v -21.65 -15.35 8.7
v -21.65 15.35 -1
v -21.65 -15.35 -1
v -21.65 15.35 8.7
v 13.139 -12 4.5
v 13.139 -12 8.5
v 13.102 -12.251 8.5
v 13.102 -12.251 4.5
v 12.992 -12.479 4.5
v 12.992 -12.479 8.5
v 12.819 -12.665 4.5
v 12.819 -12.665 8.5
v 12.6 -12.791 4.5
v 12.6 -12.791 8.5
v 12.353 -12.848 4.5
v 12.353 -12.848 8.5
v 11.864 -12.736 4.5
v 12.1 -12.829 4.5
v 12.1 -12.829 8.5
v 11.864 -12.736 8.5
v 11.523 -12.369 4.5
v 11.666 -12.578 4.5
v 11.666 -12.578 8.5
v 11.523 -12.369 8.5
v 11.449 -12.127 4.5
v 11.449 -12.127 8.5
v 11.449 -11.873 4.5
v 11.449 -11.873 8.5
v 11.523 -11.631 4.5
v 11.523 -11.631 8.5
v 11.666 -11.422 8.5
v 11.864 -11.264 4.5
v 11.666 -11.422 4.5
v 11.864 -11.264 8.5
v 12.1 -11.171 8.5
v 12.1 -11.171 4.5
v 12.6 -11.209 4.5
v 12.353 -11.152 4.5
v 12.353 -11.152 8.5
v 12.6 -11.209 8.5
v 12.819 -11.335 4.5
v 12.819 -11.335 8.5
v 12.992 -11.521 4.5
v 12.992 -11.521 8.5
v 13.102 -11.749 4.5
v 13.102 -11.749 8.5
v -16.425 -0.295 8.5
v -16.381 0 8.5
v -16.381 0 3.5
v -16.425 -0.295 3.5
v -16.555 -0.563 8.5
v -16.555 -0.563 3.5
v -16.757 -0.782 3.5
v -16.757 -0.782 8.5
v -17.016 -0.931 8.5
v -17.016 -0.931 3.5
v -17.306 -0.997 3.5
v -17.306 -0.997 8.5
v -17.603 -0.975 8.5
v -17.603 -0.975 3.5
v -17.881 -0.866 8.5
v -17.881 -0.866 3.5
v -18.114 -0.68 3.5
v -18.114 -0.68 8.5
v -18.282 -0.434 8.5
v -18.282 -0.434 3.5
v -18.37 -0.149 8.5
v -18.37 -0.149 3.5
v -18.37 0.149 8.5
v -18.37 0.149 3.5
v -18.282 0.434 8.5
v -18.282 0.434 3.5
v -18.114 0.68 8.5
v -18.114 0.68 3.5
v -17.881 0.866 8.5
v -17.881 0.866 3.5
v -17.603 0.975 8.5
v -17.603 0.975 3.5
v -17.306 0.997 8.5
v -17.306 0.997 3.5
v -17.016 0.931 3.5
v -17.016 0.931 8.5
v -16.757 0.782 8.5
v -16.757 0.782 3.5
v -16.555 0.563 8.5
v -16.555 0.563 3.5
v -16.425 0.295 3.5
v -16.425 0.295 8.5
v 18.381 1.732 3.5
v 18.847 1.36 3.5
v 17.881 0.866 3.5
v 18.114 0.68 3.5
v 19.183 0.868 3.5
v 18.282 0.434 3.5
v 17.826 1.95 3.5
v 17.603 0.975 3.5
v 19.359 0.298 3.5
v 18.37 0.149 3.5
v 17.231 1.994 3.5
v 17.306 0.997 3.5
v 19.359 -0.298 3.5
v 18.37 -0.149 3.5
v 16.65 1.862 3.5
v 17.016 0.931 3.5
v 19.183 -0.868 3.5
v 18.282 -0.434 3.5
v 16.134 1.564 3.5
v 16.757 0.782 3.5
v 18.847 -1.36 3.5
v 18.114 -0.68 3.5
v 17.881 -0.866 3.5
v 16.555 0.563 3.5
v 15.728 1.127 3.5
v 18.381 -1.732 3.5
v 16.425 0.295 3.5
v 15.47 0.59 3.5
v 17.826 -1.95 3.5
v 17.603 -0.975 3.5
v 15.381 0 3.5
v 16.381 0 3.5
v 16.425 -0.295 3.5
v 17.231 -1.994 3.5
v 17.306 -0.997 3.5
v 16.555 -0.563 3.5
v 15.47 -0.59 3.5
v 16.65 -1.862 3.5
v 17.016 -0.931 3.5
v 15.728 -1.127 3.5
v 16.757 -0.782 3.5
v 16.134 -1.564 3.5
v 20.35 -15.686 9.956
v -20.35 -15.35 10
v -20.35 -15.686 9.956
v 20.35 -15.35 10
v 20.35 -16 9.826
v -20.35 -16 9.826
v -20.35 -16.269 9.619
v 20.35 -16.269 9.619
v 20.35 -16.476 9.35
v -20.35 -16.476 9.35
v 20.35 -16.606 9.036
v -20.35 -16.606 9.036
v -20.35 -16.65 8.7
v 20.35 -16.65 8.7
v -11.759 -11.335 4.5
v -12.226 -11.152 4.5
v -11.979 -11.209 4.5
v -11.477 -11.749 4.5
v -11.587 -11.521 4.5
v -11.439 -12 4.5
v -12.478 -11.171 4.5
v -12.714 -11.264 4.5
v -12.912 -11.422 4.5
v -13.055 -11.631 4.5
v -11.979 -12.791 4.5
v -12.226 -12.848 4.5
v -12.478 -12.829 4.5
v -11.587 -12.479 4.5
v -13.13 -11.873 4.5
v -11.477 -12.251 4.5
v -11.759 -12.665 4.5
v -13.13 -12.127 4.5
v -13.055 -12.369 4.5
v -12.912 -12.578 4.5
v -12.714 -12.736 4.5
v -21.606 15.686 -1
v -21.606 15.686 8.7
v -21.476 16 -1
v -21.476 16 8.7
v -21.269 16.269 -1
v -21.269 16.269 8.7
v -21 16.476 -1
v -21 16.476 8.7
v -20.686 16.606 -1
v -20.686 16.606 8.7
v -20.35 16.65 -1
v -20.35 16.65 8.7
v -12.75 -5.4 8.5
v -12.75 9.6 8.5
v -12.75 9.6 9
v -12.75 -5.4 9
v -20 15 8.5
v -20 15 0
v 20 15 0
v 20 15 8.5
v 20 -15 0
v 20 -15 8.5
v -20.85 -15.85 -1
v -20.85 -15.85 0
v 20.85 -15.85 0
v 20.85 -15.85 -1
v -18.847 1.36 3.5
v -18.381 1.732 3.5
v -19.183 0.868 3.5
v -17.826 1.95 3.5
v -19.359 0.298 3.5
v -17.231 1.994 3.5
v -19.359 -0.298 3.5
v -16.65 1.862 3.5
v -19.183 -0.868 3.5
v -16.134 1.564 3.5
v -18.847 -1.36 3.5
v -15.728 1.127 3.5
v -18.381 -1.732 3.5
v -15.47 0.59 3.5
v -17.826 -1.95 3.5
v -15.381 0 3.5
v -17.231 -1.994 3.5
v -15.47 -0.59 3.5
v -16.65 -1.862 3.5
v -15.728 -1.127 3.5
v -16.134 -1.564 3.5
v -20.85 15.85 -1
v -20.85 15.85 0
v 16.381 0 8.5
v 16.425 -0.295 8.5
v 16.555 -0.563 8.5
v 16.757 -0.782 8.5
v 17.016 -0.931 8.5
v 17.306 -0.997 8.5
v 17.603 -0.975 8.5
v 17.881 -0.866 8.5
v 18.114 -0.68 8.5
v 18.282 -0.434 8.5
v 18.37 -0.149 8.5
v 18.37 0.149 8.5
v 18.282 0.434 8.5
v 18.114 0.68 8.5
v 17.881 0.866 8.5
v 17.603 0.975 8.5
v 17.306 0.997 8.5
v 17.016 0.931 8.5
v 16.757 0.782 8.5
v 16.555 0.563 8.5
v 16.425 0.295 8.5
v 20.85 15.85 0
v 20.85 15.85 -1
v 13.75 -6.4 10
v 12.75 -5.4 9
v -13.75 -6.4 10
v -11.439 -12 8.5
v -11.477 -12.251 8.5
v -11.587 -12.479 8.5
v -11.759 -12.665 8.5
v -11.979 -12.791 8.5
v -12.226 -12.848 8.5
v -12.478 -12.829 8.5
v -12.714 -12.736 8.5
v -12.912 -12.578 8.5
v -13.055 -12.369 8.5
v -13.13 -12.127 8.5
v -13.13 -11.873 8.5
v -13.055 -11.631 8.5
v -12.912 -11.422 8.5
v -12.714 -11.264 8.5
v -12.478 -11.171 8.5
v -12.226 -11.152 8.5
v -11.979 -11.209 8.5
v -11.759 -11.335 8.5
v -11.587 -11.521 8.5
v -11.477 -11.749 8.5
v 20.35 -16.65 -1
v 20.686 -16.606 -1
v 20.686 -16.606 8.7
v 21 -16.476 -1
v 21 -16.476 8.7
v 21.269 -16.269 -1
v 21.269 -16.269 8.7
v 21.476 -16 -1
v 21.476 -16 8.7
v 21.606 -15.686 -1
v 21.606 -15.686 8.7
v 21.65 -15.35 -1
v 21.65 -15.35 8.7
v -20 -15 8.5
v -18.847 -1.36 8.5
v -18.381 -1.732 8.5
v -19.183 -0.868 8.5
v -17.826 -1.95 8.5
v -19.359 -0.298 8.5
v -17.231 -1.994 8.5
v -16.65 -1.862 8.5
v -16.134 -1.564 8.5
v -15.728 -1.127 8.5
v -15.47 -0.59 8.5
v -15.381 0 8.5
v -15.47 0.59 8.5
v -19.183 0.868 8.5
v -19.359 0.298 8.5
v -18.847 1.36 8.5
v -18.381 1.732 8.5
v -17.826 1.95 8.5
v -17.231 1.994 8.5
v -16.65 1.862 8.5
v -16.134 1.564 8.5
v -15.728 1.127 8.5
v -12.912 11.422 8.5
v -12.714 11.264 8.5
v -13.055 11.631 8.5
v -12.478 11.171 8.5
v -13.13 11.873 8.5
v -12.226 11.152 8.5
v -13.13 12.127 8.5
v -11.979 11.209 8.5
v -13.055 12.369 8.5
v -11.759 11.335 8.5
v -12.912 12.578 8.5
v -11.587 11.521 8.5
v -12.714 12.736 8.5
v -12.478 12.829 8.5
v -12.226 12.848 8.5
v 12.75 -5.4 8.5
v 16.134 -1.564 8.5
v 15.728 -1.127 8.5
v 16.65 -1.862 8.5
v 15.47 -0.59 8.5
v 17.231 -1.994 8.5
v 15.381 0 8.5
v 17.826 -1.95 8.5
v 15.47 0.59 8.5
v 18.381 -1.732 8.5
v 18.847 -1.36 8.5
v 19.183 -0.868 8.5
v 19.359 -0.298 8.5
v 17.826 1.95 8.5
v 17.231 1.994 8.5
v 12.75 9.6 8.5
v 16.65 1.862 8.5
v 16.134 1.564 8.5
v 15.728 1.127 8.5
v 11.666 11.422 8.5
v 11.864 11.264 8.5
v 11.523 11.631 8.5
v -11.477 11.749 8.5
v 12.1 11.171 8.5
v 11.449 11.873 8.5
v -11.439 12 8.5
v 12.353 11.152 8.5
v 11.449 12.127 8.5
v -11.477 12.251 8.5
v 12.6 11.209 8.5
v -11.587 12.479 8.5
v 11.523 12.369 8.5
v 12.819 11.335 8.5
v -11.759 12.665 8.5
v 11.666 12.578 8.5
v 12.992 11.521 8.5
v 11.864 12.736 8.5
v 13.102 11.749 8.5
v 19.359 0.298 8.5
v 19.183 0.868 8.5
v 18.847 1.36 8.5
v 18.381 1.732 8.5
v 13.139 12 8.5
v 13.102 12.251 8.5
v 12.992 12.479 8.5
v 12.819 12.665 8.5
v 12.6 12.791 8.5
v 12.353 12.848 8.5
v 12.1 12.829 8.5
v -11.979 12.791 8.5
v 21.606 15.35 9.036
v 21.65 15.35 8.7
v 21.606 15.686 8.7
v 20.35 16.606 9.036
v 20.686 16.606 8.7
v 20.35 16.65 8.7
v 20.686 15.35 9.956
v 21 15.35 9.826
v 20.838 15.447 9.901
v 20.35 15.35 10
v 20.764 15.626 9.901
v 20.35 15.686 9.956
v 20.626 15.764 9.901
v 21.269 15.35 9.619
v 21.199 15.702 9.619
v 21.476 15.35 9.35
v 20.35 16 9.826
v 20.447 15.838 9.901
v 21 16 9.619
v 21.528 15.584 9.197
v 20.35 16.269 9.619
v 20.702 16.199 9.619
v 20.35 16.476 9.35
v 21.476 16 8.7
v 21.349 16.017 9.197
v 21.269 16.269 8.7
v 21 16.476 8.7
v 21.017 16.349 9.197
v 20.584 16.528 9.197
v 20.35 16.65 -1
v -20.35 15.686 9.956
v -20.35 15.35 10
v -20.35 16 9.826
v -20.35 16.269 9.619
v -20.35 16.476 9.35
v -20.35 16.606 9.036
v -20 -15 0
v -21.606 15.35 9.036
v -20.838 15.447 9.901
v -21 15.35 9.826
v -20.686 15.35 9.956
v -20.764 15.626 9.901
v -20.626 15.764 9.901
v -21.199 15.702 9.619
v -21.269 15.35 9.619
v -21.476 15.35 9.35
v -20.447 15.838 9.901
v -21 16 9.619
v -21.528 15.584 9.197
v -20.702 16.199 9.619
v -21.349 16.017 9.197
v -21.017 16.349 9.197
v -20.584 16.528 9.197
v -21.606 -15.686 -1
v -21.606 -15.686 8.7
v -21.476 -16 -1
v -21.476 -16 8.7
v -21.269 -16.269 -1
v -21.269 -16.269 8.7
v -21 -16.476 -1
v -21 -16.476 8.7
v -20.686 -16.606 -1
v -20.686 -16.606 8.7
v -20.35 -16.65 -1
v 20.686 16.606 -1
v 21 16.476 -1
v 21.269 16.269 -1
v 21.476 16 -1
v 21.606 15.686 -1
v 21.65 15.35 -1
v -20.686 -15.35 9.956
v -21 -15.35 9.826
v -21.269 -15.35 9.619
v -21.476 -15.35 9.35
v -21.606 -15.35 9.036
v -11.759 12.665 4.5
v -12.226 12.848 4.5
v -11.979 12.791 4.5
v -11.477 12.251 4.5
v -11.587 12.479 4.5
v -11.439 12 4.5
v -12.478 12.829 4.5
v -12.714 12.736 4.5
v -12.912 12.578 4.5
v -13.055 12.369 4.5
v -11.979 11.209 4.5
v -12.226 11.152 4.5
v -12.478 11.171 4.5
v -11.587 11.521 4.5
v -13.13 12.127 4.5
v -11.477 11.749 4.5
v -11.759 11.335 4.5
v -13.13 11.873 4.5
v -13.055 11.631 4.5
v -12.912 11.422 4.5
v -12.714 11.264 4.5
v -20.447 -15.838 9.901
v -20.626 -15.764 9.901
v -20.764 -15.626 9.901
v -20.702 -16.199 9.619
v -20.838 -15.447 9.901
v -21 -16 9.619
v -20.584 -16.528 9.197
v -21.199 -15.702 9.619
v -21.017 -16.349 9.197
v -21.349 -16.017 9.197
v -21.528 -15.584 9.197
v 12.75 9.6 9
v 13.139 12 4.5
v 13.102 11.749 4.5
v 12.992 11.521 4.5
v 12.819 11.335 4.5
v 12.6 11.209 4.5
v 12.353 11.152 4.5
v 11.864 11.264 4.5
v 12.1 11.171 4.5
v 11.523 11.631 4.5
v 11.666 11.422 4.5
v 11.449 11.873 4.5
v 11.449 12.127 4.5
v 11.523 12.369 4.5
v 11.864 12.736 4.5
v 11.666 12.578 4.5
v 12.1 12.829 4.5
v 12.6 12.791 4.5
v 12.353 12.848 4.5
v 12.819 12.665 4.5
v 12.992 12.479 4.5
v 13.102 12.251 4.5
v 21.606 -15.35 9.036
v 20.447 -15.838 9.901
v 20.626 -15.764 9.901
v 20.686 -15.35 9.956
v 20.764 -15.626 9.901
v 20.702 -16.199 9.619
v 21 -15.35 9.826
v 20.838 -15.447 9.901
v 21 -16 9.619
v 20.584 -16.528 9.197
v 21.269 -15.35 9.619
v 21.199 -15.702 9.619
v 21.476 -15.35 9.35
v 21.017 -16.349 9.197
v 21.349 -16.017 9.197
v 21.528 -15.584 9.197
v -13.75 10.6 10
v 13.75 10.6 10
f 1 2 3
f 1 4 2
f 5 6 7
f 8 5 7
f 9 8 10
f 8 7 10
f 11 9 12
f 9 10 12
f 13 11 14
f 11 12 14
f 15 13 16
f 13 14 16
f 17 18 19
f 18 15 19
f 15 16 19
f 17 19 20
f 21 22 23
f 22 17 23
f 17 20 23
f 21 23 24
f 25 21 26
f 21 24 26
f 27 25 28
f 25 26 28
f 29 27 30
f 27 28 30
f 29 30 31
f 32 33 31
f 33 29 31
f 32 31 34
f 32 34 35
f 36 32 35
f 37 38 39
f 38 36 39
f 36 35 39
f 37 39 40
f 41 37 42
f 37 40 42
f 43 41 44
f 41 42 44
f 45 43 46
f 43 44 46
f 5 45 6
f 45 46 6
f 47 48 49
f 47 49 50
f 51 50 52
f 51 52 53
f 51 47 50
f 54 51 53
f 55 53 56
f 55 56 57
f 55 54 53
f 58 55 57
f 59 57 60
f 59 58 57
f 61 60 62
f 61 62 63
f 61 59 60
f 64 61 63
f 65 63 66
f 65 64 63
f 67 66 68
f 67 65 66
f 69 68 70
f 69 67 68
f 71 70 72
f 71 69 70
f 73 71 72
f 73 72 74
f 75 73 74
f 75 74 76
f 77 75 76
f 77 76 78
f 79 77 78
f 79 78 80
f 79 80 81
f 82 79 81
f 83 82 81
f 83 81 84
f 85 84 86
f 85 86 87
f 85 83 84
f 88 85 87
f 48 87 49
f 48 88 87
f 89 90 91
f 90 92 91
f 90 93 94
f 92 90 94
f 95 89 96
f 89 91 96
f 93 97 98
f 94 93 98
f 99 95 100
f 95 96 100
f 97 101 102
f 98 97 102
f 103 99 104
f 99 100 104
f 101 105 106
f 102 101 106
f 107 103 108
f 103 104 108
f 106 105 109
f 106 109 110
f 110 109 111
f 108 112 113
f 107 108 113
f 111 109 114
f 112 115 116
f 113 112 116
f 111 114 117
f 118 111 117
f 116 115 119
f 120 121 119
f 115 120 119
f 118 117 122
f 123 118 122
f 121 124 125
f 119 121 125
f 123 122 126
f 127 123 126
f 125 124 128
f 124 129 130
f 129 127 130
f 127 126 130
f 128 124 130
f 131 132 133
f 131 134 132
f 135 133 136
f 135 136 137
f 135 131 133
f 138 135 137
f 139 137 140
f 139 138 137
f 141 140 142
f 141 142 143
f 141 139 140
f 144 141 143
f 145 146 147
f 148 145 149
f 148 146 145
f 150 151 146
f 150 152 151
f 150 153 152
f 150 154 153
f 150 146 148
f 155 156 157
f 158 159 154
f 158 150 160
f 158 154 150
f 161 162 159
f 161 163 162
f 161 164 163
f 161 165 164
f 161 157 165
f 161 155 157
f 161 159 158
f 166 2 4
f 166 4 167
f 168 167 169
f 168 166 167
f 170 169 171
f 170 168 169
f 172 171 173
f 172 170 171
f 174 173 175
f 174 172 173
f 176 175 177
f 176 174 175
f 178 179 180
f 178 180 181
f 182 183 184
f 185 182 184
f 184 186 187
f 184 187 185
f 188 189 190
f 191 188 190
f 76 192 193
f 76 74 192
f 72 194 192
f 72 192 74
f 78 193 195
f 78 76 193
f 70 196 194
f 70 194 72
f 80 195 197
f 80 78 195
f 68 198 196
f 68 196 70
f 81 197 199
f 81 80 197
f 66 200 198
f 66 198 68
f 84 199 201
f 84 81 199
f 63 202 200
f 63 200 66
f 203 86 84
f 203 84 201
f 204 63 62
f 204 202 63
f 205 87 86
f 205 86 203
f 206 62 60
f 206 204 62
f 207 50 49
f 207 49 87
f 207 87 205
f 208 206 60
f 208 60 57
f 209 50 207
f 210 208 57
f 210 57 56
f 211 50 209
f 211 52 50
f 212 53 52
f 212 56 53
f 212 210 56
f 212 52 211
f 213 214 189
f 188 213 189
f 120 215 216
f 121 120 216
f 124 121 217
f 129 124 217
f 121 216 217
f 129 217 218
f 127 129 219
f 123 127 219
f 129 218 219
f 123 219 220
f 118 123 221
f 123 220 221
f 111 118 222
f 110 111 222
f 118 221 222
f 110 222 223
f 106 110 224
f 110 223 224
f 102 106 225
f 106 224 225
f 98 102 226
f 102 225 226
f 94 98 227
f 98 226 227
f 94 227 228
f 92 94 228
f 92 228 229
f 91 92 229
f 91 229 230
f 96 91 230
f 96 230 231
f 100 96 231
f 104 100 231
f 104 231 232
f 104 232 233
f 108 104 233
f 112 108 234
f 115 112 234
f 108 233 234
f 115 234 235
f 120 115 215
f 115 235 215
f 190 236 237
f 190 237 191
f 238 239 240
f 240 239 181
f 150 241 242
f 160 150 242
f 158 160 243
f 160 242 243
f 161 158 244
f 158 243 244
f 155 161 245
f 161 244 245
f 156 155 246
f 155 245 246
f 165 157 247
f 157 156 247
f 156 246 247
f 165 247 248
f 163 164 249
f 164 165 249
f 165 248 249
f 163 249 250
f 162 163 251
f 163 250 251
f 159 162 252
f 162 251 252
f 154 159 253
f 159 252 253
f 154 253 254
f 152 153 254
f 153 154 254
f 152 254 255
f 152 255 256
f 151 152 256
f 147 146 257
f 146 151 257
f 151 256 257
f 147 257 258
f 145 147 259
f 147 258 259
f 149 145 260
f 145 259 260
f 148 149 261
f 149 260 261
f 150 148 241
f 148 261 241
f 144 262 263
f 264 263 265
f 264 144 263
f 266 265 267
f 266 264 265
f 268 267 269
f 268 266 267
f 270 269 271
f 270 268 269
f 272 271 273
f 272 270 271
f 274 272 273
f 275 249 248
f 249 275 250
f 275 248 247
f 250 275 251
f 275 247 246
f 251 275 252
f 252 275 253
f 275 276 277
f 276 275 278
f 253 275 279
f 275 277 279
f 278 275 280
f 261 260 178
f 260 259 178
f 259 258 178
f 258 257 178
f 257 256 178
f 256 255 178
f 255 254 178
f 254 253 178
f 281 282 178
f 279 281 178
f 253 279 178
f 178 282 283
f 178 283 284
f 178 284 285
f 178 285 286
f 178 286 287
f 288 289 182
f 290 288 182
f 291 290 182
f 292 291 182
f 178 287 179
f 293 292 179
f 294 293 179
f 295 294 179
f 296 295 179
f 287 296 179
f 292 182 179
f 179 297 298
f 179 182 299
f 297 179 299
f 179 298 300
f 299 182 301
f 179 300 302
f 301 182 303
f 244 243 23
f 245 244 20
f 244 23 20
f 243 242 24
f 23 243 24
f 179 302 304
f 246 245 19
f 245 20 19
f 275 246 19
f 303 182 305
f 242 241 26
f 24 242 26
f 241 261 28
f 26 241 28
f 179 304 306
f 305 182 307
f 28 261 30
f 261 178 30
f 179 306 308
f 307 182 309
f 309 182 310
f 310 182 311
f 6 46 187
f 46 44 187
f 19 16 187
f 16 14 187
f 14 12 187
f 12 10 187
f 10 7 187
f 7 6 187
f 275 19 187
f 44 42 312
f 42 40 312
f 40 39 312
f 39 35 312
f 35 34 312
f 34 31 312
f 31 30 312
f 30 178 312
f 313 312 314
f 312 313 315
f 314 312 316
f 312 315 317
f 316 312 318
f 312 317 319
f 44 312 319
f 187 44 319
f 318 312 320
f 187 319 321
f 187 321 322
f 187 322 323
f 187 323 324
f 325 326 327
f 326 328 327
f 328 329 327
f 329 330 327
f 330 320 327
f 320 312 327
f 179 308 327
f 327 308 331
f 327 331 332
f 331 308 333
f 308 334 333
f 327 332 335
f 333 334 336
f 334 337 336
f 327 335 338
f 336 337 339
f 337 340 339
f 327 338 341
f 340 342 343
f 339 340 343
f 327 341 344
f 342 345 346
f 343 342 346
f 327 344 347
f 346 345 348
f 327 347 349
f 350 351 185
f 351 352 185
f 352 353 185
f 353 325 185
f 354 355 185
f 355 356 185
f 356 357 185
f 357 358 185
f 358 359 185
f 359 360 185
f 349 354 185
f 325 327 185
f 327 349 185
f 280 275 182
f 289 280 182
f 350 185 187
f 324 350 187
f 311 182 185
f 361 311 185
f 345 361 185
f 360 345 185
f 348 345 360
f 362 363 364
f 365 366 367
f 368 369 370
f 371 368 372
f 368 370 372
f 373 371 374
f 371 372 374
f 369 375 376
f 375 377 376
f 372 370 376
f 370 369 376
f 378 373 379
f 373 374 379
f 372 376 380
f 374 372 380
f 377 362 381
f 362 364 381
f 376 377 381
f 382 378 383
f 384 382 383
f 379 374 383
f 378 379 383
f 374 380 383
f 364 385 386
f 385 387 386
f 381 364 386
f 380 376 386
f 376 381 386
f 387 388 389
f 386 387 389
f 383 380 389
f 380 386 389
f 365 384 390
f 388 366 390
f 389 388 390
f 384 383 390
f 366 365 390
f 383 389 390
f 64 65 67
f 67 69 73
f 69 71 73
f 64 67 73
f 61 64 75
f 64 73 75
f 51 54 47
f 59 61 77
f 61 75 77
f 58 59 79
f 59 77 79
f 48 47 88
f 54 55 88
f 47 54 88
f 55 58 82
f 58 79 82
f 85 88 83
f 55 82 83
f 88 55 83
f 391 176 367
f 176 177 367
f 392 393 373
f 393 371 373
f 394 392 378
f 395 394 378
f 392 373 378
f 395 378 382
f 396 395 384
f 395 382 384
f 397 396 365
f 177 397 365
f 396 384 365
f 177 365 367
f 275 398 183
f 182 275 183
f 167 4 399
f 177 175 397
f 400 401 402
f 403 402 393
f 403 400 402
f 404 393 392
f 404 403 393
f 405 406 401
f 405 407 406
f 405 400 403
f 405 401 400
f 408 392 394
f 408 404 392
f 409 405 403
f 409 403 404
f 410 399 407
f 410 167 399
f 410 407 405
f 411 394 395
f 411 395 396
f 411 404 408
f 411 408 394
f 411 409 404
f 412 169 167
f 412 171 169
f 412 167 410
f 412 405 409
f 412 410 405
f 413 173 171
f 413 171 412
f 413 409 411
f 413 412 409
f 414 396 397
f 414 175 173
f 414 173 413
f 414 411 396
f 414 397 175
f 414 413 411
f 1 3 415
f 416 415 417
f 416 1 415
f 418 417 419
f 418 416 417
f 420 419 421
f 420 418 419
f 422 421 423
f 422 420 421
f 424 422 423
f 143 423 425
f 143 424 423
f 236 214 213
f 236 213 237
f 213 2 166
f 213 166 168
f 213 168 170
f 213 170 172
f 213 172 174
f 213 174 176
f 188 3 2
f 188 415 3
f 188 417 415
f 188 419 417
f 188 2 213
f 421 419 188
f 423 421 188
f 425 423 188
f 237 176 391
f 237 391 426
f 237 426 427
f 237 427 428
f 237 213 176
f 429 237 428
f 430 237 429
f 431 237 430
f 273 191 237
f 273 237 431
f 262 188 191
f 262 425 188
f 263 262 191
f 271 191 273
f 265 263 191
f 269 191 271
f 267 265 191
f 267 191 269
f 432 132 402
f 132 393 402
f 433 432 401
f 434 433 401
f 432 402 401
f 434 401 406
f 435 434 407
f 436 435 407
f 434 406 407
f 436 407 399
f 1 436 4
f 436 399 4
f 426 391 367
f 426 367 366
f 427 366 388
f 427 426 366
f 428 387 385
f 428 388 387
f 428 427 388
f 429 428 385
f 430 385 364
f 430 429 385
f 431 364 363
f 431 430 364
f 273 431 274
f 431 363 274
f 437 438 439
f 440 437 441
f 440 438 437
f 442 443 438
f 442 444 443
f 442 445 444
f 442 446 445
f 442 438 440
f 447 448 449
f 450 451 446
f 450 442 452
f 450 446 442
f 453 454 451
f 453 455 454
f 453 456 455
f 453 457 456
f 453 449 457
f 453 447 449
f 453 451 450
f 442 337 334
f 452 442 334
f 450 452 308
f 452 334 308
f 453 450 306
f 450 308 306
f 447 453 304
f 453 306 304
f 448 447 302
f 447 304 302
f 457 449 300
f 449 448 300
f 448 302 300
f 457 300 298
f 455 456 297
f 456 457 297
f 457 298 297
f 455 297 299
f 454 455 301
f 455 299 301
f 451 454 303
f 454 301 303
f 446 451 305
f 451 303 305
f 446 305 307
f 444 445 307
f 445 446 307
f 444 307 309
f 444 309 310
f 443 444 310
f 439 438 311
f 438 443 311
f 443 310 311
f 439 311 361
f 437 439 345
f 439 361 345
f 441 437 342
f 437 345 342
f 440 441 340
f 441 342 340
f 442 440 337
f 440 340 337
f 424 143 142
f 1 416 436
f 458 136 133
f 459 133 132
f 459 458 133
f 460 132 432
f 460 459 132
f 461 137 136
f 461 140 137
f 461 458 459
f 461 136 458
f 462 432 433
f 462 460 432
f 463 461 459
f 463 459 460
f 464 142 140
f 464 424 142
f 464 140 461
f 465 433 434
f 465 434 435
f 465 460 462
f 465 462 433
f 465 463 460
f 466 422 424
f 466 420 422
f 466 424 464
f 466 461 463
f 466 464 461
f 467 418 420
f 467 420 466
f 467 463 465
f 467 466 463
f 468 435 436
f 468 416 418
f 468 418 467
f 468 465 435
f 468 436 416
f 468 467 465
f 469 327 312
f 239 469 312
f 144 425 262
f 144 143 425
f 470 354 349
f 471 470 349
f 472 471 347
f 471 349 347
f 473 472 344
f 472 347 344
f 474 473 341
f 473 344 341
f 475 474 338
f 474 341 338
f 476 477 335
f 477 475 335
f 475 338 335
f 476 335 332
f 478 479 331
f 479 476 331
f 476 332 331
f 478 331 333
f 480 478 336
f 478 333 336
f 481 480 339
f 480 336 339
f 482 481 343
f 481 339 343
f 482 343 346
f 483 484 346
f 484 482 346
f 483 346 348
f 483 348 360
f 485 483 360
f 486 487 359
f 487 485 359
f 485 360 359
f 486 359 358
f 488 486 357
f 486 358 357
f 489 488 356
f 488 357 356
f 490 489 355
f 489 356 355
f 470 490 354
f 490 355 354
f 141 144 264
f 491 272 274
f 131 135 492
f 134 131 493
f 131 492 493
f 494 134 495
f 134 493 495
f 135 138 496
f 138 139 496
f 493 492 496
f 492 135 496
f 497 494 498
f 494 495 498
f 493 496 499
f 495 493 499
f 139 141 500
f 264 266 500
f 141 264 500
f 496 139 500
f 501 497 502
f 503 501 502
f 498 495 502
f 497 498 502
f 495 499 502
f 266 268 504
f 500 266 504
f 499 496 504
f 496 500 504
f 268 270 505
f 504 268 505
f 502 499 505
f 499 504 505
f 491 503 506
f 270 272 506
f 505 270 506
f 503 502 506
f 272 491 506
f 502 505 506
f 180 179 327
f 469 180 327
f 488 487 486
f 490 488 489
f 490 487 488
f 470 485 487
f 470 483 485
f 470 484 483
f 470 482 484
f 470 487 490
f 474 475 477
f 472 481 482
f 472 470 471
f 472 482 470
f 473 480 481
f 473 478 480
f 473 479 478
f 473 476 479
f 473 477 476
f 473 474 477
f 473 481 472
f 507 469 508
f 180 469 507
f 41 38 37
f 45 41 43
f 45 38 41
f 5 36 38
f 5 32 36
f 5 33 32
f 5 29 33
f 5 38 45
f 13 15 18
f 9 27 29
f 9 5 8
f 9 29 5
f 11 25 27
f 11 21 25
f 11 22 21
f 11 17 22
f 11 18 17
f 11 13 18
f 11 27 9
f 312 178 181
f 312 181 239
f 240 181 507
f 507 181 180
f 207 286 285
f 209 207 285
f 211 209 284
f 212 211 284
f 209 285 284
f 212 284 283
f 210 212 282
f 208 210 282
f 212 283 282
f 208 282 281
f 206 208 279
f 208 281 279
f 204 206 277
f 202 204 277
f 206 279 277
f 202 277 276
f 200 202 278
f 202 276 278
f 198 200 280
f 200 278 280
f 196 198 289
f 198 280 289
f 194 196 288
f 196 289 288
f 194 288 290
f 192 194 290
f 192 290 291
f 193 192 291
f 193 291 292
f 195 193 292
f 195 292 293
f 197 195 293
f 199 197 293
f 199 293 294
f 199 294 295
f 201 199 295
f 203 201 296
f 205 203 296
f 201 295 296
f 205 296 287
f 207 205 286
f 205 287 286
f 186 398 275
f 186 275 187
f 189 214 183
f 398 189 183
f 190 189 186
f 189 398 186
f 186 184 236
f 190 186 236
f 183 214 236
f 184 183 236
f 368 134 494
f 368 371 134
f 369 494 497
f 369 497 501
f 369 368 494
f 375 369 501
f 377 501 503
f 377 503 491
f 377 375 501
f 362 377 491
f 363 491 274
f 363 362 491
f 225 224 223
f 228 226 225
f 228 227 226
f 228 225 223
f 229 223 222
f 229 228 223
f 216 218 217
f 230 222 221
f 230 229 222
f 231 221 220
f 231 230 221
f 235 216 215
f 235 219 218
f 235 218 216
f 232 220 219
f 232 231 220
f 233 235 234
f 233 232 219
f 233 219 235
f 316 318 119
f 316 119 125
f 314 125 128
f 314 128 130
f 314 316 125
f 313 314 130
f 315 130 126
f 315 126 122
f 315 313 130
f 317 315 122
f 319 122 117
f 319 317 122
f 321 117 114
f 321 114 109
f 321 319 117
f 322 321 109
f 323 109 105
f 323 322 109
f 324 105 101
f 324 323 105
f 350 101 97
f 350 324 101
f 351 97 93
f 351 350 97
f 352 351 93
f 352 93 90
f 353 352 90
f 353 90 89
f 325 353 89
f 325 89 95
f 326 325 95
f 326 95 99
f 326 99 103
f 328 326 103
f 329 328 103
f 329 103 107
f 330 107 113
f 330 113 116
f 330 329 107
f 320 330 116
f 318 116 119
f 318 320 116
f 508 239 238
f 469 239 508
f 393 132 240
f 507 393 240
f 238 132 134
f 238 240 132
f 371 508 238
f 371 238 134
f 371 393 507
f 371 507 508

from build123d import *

# Parameters (mm, degrees)
F0_W      = 43.3
F0_H      = 33.3
F1_DEPTH  = 10
F2_W      = 40
F2_H      = 30
F3_DEPTH  = 8.5
F4_W      = 25.5
F4_H      = 15
F5_DEPTH  = 25
F4_R      = 0.85
F6_DEPTH  = 4
F7_W      = 43.3
F7_H      = 33.3
F7_W_2    = 41.7
F7_H_2    = 31.7
F8_DEPTH  = 1
F9_R      = 2
F9_R_2    = 1
F10_DEPTH = 5
F12_SIZE  = 1
F13_R     = 1.3


with BuildPart() as f1:
    # F0 (on Top) → F1 (new body)
    with BuildSketch(Plane.XY):
        Rectangle(F0_W, F0_H)
    extrude(amount=F1_DEPTH)

    # F2 (on face) → F3 (cut)
    with BuildSketch(Plane.XY):
        Rectangle(F2_W, F2_H)
    extrude(amount=F3_DEPTH, mode=Mode.SUBTRACT)

    # F4 (on face) → F5 (cut)
    with BuildSketch(Plane(origin=(0, 0, 8.5), x_dir=(1, 0, 0), z_dir=(0, 0, -1))):
        with Locations((0, -2.1)):
            Rectangle(F4_W, F4_H)
    extrude(amount=-F5_DEPTH, mode=Mode.SUBTRACT)

    # F4 (on face) → F6 (join)
    with BuildSketch(Plane(origin=(0, 0, 8.5), x_dir=(1, 0, 0), z_dir=(0, 0, -1))):
        with Locations((12.2893061021, 12)):
            Circle(F4_R)
        with Locations((-12.2893061021, 12)):
            Circle(F4_R)
        with Locations((-12.2893061021, -12)):
            Circle(F4_R)
        with Locations((12.2893061021, -12)):
            Circle(F4_R)
    extrude(amount=F6_DEPTH)

    # F7 (on face) → F8 (join)
    with BuildSketch(Plane(origin=(0, 0, 0), x_dir=(1, 0, 0), z_dir=(0, 0, -1))):
        Rectangle(F7_W, F7_H)
        Rectangle(F7_W_2, F7_H_2, mode=Mode.SUBTRACT)
    extrude(amount=F8_DEPTH)

    # F9 (on face) → F10 (join)
    with BuildSketch(Plane(origin=(0, 0, 8.5), x_dir=(1, 0, 0), z_dir=(0, 0, -1))):
        with Locations((-17.3809109858, 0)):
            Circle(F9_R)
        with Locations((-17.3809109858, 0)):
            Circle(F9_R_2, mode=Mode.SUBTRACT)
    extrude(amount=F10_DEPTH)

    # F11: F1 across plane


with BuildPart() as f1_1:
    add(f1.part)
    add(f1.part.mirror(Plane.YZ))

    # F12
    f12_edges = [f1_1.edges().sort_by_distance(p)[0] for p in [
        (0, 9.6, 10),
        (-12.75, 2.1, 10),
        (0, -5.4, 10),
        (12.75, 2.1, 10),
    ]]
    chamfer(f12_edges, length=F12_SIZE)

    # F13
    f13_edges = [f1_1.edges().sort_by_distance(p)[0] for p in [
        (-21.65, 16.65, 4.5),
        (21.65, 16.65, 4.5),
        (21.65, -16.65, 4.5),
        (-21.65, -16.65, 4.5),
        (0, -16.65, 10),
        (-21.65, 0, 10),
        (21.65, 0, 10),
        (0, 16.65, 10),
    ]]
    fillet(f13_edges, radius=F13_R)


solid = f1_1.part
